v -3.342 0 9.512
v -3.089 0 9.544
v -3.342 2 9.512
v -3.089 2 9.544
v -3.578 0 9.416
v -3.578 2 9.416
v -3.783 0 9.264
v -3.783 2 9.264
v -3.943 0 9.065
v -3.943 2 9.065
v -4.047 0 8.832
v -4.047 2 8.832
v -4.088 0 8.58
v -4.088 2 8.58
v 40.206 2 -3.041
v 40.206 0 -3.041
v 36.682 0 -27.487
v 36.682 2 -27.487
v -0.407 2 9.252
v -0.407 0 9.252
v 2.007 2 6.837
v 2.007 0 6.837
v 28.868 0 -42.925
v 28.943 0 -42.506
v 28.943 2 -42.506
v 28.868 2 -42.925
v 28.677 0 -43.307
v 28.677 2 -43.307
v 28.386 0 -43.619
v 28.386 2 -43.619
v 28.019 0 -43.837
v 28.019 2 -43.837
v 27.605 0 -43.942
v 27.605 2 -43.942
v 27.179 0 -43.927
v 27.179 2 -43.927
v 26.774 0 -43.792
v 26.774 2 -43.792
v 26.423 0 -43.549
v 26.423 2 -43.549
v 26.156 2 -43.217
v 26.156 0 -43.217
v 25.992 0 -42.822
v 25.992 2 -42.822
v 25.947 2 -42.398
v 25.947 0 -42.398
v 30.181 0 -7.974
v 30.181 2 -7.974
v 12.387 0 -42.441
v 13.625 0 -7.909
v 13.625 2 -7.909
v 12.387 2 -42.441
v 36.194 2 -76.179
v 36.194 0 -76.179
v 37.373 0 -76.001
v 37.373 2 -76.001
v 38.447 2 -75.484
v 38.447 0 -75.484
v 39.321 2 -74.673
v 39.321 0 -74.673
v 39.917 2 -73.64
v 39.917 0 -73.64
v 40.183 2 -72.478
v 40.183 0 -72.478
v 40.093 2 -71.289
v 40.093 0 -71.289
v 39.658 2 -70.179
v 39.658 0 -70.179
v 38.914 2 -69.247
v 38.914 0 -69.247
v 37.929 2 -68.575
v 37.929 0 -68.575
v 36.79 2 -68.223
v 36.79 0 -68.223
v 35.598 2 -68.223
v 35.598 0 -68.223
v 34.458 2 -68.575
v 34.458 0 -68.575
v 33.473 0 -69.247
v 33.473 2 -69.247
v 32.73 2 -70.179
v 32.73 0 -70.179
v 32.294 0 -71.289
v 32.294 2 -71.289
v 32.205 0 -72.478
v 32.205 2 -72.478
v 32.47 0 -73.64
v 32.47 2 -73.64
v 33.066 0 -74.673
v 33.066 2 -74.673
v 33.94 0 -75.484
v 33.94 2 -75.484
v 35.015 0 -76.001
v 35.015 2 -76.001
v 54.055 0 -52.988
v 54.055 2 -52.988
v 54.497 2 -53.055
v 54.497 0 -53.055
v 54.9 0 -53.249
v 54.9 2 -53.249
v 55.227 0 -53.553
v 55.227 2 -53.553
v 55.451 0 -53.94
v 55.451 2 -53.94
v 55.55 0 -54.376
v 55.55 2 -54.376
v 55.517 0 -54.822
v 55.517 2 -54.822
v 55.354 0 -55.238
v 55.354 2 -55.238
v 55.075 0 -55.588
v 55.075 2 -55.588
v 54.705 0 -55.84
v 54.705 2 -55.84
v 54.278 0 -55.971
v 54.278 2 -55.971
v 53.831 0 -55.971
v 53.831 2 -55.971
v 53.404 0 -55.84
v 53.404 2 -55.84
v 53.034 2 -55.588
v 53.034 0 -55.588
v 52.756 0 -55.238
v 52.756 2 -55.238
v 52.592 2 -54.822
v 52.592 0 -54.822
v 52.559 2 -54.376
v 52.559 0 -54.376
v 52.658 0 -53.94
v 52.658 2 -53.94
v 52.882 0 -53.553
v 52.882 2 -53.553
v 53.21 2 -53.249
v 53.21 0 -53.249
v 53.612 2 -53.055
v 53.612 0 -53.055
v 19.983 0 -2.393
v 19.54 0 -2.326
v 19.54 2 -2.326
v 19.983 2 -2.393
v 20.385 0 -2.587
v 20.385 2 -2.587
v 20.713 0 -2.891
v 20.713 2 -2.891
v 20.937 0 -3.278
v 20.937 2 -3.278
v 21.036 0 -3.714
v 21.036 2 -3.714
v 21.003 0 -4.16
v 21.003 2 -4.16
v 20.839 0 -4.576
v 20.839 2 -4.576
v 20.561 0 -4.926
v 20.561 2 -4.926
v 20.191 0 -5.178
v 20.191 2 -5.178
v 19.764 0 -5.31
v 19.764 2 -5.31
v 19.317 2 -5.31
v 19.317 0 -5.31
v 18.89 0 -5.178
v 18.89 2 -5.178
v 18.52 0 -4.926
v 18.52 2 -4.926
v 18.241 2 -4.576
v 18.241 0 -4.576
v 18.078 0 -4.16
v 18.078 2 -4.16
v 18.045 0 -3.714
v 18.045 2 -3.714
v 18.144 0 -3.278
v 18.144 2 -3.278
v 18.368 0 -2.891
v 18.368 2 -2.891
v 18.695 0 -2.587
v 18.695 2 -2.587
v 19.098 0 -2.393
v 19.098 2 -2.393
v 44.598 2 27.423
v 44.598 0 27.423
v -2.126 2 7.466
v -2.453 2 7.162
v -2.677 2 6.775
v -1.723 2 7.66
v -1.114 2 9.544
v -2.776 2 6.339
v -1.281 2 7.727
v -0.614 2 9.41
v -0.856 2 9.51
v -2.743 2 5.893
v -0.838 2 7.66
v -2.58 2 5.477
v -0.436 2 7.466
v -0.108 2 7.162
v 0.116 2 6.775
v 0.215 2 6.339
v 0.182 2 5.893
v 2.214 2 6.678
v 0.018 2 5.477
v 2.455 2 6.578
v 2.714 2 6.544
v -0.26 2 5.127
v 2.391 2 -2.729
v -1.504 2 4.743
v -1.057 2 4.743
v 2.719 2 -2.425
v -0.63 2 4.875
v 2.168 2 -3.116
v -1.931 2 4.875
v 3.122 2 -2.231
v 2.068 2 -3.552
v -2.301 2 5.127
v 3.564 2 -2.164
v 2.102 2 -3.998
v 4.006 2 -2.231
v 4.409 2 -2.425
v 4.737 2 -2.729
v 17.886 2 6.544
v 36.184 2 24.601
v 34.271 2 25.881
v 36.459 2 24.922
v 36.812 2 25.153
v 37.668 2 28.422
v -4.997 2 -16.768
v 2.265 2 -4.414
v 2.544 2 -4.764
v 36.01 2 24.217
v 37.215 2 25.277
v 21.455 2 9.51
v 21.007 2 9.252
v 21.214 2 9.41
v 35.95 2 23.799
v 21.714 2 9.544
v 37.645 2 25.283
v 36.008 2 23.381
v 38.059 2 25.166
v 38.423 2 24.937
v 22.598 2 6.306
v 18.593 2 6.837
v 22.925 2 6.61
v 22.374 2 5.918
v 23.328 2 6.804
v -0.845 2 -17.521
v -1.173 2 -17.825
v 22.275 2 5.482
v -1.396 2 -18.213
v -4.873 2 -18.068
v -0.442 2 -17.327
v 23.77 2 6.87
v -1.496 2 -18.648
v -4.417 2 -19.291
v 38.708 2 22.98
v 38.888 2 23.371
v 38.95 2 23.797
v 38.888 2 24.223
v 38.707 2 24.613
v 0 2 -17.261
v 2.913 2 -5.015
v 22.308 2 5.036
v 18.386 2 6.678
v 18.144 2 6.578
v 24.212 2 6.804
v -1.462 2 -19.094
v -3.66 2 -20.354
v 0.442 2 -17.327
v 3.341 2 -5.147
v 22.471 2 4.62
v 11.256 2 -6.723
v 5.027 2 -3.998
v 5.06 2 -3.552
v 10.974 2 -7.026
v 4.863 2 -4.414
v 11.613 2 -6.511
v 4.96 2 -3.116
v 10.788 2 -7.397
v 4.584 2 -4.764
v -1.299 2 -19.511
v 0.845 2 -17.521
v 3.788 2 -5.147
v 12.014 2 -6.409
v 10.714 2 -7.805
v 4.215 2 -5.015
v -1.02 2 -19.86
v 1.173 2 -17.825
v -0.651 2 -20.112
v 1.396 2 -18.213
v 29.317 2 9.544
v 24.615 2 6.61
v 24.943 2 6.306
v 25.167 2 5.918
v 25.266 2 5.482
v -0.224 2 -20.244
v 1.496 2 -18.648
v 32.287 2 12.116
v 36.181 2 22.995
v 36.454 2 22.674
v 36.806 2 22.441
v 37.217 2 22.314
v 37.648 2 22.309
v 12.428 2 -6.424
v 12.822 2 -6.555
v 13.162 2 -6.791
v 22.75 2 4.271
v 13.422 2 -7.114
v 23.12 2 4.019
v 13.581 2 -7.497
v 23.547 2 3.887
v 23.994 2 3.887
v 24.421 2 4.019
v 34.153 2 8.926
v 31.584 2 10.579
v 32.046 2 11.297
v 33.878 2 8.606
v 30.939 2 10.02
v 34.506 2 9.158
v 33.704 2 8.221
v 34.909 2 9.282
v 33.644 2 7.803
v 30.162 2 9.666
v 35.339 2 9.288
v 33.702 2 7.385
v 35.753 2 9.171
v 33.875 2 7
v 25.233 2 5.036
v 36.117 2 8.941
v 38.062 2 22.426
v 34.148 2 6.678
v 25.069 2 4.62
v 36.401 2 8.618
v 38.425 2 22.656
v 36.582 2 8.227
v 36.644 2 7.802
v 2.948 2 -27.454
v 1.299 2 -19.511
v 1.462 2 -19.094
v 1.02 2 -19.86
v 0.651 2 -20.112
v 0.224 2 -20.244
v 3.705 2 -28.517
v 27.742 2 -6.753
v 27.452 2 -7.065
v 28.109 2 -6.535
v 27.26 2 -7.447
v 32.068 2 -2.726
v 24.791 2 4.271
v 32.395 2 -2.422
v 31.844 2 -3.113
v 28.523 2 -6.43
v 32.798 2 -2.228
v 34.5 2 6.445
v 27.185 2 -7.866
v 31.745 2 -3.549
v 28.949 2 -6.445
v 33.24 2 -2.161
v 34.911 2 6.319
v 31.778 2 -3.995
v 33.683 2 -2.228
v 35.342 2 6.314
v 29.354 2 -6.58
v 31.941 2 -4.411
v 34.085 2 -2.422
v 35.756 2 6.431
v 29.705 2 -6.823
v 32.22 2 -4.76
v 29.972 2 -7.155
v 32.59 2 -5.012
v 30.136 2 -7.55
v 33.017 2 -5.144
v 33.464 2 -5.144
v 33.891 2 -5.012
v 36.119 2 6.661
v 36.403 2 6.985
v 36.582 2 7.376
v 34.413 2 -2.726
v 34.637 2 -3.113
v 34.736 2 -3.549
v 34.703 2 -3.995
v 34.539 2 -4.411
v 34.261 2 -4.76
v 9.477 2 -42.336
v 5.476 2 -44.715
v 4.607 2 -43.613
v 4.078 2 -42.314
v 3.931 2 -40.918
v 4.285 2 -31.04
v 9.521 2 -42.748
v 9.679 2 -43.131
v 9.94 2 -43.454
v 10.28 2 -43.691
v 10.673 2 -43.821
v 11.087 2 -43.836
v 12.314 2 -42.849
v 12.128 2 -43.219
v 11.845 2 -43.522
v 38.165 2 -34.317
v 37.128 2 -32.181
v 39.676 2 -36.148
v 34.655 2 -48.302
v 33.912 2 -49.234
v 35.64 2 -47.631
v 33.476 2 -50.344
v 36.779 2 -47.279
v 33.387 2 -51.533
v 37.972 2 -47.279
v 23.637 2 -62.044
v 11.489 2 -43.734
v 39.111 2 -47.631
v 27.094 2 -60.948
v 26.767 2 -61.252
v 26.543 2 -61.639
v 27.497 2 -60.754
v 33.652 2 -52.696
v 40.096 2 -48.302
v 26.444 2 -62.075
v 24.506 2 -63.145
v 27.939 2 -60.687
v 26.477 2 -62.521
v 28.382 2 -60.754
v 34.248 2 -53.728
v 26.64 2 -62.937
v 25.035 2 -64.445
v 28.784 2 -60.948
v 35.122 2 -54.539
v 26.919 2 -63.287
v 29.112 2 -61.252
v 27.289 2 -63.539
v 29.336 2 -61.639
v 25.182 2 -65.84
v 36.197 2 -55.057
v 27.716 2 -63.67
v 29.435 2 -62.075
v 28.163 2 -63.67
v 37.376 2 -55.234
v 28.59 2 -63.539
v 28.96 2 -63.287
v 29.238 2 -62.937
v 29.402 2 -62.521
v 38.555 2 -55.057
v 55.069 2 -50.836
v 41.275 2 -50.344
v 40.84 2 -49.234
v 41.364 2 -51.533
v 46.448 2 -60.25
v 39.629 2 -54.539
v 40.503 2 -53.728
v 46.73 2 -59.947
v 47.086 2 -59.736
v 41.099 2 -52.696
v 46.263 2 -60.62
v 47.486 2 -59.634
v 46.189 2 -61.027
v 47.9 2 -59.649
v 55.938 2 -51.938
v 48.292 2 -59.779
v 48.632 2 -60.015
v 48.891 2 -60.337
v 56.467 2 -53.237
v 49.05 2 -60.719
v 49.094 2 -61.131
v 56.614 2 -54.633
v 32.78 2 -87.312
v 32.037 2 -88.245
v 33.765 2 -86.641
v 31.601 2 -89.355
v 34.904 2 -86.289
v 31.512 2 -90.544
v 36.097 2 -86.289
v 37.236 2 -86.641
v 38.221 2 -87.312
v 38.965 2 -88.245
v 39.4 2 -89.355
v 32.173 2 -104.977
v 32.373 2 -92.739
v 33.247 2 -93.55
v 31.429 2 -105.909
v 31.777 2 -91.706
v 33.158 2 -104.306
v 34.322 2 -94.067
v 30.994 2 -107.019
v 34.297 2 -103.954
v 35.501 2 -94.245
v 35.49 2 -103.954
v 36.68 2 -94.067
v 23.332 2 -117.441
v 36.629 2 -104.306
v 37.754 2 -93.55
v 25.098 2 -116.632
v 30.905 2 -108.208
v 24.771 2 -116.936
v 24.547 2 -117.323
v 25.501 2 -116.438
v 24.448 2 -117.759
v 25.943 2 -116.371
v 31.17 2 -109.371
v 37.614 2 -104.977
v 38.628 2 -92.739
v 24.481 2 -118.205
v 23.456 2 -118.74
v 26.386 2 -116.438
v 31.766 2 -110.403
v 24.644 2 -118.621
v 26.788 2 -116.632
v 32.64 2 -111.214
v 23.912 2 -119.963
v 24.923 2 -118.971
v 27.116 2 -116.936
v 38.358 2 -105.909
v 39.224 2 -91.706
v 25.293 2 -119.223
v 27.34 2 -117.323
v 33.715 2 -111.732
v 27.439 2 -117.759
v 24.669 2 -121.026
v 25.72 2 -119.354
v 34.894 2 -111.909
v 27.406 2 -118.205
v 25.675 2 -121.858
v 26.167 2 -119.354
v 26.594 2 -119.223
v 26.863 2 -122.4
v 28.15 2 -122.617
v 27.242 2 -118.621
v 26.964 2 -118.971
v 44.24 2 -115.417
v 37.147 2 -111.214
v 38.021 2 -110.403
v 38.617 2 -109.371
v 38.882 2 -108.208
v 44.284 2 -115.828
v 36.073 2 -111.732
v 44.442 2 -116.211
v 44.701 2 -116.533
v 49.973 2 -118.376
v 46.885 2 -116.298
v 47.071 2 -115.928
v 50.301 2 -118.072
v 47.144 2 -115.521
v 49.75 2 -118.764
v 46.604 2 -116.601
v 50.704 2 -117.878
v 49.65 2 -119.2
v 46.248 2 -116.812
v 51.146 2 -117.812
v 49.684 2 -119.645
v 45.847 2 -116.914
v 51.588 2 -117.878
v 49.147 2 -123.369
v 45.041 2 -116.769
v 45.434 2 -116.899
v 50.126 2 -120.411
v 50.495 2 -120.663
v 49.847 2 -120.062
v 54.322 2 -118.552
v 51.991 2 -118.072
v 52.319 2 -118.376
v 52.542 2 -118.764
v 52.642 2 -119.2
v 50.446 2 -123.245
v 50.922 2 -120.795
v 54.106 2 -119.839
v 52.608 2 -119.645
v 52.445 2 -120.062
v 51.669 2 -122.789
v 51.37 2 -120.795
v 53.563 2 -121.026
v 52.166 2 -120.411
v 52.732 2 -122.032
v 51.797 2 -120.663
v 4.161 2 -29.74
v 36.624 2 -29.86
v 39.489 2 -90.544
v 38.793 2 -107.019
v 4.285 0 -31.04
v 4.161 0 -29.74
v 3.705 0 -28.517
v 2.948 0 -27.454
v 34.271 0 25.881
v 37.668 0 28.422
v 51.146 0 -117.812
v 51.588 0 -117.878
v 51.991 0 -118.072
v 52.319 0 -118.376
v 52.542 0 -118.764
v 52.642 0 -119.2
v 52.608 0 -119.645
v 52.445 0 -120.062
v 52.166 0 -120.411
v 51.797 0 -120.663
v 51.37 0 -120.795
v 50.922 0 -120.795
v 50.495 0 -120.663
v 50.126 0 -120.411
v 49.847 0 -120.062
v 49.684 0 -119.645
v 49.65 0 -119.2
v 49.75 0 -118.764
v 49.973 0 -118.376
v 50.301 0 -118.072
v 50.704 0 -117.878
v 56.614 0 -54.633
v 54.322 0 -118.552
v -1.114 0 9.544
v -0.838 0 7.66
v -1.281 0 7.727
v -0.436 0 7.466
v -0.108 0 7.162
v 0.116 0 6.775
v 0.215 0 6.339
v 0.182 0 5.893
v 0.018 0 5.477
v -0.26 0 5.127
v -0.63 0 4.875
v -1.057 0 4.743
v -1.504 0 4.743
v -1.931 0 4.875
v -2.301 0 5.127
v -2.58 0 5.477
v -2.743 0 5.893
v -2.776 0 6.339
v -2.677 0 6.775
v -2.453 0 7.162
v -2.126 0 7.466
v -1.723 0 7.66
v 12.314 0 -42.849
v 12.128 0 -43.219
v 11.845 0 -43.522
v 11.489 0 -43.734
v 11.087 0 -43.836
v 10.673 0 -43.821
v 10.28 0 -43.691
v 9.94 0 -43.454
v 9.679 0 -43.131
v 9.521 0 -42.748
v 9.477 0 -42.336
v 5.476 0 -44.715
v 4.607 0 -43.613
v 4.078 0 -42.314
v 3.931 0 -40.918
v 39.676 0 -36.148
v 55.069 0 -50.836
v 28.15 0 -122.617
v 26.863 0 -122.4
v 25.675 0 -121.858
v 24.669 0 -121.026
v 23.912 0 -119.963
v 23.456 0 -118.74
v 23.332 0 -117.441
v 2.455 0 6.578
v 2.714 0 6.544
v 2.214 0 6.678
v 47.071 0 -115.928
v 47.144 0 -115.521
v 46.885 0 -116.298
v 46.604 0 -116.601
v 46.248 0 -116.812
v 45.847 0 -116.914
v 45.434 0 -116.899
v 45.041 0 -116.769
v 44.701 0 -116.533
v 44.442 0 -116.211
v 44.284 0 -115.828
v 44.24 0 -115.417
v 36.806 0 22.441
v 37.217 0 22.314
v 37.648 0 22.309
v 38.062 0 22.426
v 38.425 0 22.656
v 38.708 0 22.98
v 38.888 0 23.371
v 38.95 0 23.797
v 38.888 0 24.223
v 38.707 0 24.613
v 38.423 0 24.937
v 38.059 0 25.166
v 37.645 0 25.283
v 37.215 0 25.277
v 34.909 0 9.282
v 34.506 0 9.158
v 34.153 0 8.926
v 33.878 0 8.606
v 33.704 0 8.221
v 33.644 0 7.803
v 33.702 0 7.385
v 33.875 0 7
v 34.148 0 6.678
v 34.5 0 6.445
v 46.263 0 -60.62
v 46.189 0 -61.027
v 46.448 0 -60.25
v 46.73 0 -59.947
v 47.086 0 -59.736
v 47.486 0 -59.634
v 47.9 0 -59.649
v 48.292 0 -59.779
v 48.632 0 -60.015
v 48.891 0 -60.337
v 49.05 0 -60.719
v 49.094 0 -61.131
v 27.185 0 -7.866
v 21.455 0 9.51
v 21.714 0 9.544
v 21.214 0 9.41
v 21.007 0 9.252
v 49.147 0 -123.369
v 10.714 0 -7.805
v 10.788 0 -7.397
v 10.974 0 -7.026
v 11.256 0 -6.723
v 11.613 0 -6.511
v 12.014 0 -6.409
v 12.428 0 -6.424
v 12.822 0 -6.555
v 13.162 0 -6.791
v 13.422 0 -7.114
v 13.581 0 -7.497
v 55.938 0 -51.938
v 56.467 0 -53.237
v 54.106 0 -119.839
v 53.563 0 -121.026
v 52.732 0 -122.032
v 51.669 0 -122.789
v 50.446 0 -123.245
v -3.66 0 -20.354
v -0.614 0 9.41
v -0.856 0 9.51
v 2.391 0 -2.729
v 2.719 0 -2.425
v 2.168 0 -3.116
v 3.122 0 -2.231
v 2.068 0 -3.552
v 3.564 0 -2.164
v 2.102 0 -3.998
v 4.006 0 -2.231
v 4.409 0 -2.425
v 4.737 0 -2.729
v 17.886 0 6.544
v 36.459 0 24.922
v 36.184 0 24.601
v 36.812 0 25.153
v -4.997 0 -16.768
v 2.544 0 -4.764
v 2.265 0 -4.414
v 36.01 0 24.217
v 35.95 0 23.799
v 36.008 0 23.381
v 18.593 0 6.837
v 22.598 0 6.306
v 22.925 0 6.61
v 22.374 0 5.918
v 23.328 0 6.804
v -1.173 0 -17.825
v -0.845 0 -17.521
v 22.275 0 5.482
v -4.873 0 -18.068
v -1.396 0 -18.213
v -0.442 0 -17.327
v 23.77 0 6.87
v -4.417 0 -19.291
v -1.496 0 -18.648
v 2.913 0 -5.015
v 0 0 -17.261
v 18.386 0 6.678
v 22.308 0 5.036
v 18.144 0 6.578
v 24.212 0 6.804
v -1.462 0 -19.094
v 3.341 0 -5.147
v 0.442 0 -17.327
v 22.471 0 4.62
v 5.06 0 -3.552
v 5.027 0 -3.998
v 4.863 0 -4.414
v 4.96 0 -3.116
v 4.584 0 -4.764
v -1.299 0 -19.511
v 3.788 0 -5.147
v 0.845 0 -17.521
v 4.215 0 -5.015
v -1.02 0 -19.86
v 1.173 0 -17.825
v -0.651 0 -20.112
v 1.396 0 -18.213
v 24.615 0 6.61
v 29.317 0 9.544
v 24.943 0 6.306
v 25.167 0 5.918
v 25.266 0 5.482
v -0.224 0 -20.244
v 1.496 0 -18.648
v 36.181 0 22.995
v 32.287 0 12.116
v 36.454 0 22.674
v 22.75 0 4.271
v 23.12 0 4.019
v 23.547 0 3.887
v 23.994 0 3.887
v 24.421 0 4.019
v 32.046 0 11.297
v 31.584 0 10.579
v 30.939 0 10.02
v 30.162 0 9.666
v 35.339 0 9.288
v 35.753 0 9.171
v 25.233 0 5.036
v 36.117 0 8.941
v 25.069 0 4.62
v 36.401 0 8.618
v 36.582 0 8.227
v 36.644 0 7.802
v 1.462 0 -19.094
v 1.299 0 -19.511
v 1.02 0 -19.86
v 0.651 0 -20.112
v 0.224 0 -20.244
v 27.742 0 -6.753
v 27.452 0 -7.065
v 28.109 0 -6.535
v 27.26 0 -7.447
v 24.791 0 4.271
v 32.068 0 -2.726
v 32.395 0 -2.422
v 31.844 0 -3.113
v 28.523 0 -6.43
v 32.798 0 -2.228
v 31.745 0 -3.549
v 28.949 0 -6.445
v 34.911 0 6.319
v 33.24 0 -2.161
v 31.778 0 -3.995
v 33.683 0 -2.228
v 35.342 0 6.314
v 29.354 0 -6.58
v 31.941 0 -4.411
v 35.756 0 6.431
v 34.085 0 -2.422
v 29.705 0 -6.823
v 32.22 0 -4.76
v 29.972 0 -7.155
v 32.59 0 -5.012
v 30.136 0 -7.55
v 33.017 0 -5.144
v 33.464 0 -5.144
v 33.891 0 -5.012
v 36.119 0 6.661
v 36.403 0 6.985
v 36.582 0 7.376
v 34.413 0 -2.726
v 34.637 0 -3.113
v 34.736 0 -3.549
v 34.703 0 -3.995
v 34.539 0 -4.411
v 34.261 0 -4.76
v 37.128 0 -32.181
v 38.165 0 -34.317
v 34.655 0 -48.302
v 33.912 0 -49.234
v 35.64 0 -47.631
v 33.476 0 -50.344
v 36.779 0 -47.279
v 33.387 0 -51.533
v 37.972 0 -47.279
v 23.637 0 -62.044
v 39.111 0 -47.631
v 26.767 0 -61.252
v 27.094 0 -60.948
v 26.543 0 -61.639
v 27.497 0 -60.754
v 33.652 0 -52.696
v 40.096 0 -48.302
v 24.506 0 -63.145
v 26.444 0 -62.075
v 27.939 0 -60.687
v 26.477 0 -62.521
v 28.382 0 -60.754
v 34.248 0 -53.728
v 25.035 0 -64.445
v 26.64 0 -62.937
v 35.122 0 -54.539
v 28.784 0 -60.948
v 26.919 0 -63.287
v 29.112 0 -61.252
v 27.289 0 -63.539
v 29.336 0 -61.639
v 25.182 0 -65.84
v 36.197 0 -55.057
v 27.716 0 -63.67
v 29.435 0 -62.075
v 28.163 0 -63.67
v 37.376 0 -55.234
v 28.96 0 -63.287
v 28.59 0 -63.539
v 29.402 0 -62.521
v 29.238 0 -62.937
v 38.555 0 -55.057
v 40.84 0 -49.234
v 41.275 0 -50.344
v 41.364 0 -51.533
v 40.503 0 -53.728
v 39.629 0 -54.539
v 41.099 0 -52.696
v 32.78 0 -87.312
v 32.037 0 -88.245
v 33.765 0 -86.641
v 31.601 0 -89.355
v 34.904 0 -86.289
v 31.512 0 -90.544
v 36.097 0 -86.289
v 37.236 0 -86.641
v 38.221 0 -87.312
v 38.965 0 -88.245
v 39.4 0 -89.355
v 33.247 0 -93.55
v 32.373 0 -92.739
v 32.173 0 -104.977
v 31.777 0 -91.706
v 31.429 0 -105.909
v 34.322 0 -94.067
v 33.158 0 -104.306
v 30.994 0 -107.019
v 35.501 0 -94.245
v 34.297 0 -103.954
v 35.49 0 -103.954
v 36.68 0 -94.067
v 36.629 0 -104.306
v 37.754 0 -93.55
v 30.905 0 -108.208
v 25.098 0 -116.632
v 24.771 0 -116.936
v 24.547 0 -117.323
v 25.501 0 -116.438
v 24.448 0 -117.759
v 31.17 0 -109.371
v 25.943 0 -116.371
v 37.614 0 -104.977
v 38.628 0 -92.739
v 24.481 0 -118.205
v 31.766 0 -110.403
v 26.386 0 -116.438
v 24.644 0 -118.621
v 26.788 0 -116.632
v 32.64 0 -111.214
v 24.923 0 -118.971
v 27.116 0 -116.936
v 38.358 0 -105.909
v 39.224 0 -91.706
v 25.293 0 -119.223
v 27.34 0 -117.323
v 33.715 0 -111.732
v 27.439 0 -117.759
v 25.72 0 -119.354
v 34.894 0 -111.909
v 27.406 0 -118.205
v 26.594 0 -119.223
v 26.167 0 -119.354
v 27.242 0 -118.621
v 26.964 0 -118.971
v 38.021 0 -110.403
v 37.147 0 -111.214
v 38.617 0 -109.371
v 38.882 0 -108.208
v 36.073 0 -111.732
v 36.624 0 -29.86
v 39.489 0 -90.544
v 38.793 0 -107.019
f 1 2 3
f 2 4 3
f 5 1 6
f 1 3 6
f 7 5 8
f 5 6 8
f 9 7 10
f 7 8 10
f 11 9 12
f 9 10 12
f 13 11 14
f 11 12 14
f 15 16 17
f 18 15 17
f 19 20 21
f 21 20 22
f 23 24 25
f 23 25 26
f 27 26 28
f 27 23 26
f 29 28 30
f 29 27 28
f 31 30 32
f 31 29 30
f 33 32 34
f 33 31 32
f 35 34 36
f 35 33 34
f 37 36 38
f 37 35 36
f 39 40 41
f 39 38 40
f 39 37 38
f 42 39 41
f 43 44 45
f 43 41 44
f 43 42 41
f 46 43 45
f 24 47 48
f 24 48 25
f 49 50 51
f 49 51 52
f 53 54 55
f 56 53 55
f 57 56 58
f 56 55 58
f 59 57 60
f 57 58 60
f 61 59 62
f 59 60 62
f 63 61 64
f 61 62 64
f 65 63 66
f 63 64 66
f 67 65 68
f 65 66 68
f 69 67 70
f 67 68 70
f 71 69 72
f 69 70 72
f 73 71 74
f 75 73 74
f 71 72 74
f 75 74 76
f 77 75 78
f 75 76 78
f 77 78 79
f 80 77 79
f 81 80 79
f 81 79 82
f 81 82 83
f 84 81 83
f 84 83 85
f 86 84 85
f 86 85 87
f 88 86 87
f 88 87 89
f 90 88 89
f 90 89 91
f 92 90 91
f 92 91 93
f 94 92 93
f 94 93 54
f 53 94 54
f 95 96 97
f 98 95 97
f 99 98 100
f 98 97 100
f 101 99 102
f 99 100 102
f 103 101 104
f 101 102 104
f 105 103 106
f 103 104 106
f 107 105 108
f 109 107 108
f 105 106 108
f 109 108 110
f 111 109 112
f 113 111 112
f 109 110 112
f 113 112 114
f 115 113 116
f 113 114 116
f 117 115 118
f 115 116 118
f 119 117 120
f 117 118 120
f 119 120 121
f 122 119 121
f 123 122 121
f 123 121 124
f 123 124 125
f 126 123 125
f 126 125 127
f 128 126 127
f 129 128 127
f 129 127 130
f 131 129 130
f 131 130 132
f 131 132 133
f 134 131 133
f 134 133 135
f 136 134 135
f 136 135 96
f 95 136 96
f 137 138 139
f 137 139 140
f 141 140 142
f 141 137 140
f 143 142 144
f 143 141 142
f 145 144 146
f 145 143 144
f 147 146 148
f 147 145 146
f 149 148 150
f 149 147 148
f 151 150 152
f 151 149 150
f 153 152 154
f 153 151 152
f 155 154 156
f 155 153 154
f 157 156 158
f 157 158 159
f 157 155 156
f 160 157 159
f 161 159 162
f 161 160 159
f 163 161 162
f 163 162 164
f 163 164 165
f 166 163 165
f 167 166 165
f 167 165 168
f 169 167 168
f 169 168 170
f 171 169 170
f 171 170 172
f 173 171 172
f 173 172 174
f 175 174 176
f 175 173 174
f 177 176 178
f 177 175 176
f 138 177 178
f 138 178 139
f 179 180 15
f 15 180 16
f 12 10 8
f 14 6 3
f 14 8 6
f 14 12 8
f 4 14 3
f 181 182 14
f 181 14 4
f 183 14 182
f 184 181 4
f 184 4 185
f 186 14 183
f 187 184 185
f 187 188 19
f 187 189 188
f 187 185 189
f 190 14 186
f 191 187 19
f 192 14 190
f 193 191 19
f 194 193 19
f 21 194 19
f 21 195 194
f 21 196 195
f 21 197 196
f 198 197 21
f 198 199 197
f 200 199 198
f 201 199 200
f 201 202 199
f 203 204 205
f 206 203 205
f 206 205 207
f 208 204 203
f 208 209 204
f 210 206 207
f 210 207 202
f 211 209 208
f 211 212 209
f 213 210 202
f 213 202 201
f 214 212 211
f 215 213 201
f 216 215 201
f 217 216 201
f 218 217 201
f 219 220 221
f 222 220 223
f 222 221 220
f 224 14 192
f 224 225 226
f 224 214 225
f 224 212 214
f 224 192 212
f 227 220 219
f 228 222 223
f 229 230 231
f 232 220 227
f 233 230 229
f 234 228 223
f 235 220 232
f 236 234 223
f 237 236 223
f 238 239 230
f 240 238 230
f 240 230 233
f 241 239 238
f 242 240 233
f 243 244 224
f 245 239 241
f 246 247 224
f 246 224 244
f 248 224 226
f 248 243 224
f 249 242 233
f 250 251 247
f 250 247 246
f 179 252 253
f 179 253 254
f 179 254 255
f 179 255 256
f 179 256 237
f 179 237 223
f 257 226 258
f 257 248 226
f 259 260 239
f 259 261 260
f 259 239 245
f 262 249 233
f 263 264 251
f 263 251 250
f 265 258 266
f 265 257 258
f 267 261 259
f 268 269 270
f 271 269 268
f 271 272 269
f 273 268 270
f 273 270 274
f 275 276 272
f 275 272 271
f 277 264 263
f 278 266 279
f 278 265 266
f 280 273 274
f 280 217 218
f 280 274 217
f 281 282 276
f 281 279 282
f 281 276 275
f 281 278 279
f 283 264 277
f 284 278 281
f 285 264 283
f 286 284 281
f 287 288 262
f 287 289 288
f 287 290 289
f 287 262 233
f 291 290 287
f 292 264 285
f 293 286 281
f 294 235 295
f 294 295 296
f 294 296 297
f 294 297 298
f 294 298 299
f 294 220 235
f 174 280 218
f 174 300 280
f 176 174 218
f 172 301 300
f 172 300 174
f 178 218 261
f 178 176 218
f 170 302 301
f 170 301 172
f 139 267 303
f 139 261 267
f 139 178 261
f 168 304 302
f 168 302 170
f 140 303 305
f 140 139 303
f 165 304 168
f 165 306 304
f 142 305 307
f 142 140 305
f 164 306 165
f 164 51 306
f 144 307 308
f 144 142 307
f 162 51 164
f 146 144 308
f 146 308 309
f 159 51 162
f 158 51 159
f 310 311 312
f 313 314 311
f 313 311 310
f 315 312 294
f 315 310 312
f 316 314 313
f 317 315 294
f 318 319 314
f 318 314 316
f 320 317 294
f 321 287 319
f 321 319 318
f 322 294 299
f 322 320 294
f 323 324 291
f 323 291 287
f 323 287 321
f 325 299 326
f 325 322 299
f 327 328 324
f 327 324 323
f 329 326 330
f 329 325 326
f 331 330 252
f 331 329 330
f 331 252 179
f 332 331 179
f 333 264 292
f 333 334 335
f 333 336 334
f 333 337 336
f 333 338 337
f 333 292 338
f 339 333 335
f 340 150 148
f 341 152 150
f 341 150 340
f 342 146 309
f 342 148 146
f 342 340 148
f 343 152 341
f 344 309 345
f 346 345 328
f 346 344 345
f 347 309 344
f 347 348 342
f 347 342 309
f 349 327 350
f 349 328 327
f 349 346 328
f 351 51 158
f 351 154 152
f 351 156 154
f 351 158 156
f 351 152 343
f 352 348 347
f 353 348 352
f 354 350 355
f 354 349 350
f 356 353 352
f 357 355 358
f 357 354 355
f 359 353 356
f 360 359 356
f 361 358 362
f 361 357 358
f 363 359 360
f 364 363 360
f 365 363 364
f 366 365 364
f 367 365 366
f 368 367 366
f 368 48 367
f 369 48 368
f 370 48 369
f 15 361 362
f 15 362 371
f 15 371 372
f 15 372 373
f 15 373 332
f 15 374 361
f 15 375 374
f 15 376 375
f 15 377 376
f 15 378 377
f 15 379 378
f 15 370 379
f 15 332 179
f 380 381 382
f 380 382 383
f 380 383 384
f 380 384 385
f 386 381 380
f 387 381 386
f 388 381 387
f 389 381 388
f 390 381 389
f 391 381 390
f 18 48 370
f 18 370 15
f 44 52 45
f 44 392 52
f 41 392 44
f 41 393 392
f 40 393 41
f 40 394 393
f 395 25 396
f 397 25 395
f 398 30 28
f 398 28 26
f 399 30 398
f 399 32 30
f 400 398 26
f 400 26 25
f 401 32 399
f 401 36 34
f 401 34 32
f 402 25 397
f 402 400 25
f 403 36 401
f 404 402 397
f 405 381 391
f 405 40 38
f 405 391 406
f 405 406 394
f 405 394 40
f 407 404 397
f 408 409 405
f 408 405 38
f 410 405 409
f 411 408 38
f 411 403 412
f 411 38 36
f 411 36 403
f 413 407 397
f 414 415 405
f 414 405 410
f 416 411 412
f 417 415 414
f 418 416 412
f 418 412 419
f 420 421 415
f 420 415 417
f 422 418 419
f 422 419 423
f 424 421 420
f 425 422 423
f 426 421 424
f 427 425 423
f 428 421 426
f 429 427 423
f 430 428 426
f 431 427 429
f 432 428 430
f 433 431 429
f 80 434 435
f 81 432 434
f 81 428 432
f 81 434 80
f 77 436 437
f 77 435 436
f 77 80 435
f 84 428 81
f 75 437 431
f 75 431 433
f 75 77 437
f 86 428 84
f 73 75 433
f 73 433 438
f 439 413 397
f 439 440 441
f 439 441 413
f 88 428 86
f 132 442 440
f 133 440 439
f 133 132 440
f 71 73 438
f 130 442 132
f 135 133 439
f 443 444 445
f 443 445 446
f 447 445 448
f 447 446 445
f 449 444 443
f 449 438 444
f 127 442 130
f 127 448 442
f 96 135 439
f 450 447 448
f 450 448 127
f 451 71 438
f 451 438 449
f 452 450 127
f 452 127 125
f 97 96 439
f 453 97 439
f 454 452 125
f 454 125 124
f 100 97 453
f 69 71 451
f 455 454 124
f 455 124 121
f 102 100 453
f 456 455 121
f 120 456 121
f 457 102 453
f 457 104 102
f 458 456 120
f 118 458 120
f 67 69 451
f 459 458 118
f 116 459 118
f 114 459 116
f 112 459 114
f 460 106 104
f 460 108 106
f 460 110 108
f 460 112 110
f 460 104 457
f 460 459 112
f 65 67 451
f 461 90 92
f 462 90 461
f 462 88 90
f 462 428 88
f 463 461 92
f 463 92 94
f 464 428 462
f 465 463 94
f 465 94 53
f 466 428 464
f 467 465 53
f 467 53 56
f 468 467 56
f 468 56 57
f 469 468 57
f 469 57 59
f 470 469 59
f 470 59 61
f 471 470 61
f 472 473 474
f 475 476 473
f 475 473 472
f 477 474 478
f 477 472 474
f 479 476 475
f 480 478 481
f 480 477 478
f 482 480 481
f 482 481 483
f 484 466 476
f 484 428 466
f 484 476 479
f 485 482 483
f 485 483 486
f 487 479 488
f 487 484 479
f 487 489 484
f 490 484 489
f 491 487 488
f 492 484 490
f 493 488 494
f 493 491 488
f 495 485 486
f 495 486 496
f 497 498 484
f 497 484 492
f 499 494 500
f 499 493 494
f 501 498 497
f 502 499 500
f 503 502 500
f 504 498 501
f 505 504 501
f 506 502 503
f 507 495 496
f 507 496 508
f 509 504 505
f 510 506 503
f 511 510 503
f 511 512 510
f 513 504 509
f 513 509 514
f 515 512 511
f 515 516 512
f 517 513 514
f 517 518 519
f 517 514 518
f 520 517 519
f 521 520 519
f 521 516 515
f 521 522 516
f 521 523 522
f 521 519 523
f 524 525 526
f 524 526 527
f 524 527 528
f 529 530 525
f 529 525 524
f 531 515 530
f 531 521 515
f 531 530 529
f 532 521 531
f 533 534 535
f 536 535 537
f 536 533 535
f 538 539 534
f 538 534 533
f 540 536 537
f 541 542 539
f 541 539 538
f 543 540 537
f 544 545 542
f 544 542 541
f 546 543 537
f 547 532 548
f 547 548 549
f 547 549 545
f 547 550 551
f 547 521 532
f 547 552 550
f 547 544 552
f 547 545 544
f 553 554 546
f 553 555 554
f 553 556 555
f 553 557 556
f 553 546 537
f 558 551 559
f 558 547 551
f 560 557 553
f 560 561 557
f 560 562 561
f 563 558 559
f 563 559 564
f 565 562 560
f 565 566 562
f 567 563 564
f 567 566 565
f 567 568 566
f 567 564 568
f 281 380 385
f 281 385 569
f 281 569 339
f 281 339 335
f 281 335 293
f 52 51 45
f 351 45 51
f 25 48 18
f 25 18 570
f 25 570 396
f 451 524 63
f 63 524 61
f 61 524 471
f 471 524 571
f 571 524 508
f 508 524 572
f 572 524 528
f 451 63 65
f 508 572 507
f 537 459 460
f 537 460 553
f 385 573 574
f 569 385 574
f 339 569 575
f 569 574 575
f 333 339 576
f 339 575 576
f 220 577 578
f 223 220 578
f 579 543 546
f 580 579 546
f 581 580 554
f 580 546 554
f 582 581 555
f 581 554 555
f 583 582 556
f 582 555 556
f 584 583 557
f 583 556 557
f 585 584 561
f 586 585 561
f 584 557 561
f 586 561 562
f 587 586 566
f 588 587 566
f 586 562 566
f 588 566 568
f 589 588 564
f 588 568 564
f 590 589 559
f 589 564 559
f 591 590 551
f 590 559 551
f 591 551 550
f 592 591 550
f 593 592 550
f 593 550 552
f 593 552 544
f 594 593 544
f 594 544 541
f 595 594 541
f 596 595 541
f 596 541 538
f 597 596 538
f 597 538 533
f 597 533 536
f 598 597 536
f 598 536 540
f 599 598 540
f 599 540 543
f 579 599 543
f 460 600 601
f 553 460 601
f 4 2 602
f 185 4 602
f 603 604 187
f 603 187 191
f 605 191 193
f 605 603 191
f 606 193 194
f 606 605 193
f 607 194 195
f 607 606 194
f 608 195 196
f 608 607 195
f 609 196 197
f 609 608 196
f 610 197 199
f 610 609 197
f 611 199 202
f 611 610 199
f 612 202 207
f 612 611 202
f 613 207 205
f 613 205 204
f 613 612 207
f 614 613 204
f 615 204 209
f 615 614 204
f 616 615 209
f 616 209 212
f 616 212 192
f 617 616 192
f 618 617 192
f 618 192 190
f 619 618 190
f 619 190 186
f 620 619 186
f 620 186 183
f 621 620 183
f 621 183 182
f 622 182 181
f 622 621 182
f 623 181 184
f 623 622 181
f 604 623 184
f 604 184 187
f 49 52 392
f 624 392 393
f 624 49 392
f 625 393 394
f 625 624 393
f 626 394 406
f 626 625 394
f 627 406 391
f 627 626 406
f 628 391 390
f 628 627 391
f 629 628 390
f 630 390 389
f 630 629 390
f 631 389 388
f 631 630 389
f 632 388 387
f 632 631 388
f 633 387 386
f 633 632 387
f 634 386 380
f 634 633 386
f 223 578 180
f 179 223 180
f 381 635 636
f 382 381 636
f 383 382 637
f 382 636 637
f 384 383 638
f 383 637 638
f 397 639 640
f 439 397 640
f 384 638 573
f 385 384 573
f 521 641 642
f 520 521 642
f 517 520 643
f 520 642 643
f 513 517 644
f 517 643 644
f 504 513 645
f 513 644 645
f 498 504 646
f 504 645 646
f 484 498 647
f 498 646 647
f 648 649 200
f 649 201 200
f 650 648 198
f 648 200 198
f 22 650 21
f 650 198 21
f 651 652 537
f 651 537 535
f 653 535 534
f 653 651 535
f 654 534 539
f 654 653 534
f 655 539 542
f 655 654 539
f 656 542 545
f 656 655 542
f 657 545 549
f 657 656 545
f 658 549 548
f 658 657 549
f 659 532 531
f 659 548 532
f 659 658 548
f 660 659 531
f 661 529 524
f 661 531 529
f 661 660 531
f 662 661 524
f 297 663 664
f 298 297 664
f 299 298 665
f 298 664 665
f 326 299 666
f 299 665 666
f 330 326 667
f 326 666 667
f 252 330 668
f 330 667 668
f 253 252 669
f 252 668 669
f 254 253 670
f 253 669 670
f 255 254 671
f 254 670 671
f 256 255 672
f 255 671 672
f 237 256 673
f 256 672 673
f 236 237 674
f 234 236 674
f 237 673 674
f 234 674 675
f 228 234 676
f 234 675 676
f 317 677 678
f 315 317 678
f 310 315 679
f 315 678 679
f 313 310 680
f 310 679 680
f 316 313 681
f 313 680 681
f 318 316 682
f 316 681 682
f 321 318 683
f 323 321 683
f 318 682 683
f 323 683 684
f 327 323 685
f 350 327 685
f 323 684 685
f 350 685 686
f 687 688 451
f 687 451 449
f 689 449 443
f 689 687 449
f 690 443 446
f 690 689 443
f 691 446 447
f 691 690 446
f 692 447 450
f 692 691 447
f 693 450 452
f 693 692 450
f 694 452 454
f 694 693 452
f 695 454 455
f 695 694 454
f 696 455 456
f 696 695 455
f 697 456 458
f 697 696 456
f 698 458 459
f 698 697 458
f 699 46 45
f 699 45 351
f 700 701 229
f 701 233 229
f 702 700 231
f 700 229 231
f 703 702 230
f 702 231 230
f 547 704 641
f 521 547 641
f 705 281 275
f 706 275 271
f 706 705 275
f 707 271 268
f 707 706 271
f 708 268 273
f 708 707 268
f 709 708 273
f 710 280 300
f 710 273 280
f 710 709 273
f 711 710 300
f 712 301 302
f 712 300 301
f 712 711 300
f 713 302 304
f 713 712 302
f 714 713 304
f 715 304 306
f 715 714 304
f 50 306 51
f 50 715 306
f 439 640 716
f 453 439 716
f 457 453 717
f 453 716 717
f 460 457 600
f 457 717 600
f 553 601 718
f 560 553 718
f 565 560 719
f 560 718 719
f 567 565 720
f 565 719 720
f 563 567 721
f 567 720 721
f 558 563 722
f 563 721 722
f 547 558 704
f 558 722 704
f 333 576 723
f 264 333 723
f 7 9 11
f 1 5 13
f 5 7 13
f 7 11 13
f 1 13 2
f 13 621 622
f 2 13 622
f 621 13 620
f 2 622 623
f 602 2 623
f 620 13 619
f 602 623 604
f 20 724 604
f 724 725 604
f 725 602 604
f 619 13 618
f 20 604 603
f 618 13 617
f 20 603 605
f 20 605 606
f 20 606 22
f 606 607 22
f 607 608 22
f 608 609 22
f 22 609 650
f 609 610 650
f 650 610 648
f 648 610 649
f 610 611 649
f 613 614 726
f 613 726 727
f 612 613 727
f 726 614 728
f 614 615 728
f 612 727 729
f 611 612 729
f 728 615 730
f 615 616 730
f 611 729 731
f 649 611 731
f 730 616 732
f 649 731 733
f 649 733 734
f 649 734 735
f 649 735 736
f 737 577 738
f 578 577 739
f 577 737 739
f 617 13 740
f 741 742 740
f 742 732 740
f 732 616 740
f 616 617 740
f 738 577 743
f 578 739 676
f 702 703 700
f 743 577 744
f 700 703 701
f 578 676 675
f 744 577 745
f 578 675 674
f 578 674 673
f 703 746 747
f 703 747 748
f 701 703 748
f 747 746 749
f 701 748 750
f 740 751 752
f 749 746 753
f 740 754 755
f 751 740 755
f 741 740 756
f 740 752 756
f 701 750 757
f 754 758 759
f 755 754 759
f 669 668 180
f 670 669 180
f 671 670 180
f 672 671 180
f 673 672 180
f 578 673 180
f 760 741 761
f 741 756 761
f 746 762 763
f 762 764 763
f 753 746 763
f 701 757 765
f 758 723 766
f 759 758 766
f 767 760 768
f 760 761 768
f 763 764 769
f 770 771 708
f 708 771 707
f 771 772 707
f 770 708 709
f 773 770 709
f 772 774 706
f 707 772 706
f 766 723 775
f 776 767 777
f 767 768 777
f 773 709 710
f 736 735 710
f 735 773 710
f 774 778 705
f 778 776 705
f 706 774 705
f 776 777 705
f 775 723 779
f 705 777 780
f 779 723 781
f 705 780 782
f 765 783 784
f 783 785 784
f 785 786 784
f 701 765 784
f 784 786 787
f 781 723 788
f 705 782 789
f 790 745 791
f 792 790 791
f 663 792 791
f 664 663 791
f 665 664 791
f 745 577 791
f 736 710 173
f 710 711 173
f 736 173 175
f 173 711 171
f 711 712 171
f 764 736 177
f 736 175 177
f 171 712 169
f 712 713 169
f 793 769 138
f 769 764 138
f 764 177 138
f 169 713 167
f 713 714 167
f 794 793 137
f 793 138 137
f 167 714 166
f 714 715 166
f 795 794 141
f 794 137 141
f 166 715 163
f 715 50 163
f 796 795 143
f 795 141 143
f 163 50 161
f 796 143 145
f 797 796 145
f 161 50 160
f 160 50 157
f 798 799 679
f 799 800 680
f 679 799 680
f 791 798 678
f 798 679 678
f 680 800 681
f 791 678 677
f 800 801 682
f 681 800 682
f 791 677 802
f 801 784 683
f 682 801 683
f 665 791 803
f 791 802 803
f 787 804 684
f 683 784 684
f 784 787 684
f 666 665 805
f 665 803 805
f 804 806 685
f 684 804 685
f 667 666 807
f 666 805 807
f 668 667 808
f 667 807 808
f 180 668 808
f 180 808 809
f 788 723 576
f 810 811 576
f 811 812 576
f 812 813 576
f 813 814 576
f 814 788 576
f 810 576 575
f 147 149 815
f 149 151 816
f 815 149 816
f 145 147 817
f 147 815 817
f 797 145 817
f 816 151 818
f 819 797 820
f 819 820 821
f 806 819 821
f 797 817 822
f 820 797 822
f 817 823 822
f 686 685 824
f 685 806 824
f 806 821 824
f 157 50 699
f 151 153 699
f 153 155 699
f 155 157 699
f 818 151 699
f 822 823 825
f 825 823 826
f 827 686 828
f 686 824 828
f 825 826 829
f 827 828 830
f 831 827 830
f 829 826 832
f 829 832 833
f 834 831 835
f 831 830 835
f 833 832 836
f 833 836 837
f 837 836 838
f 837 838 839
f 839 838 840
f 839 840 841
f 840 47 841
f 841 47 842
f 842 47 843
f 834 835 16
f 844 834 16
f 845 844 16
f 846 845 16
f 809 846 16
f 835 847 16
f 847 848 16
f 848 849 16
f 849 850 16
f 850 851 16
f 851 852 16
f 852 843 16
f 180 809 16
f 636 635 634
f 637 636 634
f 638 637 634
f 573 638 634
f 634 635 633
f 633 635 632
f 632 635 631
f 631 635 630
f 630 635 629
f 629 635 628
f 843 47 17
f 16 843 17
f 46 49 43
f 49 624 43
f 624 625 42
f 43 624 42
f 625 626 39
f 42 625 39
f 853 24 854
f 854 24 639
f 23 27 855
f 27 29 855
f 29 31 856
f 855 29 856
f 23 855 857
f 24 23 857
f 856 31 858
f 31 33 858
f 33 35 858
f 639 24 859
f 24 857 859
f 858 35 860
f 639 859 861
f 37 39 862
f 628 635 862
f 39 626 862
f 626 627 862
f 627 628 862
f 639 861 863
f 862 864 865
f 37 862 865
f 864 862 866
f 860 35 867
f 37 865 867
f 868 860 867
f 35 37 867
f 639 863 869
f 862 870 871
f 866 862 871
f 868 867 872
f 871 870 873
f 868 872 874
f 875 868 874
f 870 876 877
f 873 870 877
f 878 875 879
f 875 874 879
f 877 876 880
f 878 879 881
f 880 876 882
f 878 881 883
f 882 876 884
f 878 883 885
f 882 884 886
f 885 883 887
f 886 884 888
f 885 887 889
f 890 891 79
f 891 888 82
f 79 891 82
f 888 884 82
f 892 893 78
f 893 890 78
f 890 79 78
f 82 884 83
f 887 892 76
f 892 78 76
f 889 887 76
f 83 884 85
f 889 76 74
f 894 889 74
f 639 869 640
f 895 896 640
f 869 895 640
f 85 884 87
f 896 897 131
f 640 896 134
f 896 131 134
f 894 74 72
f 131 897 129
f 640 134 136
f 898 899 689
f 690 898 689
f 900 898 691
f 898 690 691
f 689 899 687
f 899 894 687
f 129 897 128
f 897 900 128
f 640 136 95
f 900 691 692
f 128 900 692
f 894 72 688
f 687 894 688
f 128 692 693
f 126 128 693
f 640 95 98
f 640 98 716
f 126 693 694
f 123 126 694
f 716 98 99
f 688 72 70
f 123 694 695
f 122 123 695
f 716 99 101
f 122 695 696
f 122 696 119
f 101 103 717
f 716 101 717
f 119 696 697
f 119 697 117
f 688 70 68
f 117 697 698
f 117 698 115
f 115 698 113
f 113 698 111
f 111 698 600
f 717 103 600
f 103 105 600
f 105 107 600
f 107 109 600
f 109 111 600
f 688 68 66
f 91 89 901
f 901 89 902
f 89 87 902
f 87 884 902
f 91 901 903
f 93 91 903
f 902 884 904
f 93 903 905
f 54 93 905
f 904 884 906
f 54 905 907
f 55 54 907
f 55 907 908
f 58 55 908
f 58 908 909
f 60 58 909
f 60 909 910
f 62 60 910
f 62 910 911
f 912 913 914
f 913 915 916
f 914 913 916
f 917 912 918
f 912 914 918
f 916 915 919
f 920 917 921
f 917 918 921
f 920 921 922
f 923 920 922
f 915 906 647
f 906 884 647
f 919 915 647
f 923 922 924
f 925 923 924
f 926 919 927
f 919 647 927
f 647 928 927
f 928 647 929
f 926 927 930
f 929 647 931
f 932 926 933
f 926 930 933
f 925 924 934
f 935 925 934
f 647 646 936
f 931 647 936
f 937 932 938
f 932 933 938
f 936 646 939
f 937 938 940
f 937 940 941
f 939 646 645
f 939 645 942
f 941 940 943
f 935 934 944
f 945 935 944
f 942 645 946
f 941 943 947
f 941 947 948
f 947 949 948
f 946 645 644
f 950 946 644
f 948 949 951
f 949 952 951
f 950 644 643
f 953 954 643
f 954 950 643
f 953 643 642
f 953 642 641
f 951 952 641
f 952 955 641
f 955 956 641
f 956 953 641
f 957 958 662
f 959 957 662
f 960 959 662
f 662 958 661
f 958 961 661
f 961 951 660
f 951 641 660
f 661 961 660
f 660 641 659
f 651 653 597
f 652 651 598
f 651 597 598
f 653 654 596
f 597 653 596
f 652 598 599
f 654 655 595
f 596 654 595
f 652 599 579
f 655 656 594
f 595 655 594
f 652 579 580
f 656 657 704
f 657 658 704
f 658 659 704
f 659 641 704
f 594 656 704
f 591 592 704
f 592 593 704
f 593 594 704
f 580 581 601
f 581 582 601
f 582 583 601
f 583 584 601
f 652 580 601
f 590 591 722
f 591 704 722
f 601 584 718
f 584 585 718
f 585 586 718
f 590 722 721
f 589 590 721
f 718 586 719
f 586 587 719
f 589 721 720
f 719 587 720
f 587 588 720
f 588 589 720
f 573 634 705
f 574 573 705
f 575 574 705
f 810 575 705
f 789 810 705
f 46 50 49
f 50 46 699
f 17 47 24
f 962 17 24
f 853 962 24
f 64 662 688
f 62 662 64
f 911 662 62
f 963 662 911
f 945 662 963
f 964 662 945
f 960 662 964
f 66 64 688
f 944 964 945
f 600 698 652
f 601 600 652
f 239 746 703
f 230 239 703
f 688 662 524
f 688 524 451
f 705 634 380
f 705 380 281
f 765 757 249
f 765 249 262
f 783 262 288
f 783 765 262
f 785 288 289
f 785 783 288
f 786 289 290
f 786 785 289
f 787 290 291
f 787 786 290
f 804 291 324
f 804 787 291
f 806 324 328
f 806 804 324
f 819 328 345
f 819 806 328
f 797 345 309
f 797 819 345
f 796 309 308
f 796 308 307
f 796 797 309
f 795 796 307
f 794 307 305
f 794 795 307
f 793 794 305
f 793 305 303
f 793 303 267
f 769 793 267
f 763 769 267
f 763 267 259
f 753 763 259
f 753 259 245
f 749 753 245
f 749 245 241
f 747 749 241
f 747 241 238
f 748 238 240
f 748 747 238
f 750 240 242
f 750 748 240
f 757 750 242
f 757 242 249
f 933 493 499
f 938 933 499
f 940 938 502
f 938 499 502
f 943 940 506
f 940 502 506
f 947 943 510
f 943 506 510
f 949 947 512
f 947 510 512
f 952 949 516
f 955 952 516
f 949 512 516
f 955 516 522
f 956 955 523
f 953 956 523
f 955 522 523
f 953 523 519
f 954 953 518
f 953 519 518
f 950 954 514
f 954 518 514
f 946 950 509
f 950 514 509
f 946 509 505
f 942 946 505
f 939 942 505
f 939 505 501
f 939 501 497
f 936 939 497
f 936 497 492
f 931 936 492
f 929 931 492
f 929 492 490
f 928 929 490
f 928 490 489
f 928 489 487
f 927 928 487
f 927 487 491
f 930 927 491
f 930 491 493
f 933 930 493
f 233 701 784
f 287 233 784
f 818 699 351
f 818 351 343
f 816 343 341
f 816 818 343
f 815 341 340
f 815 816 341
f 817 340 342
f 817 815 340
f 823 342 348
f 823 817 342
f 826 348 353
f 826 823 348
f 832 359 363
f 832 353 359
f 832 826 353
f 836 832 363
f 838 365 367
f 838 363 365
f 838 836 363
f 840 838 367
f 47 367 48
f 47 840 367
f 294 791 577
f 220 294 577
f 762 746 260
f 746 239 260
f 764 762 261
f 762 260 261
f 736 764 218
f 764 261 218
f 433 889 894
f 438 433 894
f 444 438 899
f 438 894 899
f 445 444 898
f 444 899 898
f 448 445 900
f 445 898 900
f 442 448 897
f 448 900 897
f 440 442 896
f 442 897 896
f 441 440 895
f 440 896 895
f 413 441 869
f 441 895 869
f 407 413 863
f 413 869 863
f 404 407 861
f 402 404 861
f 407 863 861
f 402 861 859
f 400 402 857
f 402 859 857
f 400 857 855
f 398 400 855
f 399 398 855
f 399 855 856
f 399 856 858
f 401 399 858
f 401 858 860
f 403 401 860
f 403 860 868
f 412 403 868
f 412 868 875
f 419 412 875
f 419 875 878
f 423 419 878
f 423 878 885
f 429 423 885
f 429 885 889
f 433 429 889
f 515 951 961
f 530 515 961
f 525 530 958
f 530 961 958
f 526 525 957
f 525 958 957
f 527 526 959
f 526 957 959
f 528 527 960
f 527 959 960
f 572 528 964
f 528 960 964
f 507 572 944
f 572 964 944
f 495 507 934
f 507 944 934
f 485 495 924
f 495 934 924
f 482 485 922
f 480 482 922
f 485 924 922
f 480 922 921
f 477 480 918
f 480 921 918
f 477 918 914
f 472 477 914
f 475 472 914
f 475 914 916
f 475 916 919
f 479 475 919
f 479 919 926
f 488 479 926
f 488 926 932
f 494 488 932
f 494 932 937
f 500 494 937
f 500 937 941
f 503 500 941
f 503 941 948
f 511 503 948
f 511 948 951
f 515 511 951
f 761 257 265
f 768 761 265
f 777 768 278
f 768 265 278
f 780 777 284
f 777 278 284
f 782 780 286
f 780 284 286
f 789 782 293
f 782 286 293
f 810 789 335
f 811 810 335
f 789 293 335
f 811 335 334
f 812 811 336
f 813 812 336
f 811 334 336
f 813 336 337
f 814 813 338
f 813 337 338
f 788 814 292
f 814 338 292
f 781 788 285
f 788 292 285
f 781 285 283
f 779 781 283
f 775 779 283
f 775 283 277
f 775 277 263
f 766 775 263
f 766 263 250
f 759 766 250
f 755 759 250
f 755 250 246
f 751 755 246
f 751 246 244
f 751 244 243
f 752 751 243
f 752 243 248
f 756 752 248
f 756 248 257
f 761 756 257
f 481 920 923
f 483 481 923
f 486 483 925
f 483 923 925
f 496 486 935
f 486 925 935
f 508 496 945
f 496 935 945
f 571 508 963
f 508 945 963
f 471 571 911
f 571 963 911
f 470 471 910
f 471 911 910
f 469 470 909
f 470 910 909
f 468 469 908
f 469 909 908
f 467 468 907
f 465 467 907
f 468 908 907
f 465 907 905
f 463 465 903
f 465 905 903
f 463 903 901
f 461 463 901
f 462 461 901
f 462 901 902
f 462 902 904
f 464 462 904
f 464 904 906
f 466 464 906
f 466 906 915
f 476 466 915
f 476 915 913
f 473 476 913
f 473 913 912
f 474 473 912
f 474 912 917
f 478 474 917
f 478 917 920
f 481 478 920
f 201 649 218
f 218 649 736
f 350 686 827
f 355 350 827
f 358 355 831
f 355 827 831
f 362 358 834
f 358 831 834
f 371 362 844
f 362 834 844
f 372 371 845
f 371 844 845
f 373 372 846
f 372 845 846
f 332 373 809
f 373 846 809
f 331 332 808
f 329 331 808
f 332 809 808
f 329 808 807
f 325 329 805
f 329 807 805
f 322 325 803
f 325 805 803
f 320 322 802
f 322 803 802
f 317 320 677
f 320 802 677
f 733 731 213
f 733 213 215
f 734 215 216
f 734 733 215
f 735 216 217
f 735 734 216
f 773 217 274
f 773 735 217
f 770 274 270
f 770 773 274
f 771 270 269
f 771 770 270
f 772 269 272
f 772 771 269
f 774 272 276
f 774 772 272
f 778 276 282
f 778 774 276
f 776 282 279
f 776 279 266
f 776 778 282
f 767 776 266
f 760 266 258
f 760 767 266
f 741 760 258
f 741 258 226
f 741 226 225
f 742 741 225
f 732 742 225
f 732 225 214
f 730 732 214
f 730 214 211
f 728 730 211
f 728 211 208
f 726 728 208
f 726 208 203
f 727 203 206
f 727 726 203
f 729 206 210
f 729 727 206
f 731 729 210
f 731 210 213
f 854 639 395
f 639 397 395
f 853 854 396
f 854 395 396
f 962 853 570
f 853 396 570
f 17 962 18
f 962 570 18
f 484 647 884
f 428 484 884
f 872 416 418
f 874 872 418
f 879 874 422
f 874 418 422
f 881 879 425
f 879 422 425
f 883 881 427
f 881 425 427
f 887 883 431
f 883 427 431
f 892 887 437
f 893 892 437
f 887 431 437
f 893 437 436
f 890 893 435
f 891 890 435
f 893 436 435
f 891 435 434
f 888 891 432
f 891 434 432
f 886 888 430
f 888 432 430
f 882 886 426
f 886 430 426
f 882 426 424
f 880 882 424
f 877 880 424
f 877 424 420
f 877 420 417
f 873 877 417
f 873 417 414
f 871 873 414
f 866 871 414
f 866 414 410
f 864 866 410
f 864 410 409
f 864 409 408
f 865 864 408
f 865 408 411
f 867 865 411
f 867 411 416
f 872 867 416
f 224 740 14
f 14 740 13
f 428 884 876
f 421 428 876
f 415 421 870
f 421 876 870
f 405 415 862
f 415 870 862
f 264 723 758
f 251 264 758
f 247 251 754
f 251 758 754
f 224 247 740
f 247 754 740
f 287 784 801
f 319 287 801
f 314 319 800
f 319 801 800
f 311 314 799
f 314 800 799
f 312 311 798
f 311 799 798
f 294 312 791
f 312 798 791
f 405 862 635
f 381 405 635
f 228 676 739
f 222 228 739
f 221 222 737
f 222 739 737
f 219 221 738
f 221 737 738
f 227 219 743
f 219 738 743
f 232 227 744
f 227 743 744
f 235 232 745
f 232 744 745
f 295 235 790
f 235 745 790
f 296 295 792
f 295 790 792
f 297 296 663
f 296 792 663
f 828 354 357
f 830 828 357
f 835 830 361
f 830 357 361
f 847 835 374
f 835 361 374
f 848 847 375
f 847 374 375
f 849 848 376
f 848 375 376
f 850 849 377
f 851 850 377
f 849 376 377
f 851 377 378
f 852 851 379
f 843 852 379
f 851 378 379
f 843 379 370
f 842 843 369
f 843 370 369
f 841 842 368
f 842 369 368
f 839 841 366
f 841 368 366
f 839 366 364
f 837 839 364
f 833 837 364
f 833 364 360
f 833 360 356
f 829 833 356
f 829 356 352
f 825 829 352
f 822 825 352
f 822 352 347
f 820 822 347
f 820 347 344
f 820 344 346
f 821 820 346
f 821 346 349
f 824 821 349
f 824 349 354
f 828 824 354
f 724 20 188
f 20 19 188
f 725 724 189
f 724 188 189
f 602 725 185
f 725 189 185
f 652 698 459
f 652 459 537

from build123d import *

# Parameters (mm, degrees)
SKETCH1_R           = 1.5
BOSS_EXTRUDE1_DEPTH = 2
SKETCH2_R           = 4
CUT_EXTRUDE1_DEPTH  = 136.757961465
SKETCH3_R           = 1.5
CUT_EXTRUDE2_DEPTH  = 10
FILLET1_R           = 10
CUT_EXTRUDE3_DEPTH  = 23
FILLET2_R           = 1


with BuildPart() as part:
    # Sketch1 → Boss-Extrude1 (new body)
    with BuildSketch(Plane(origin=(0, 0, 0), x_dir=(1, 0, 0), z_dir=(0, 1, 0))):
        with BuildLine():
            Line((35.946087305, 32.589224444), (55.068611132, 50.836380863))
            ThreePointArc((55.068611132, 50.836380863), (56.248023483, 52.569022886), (56.613633222, 54.632852189))
            Line((56.613633222, 54.632852189), (54.322448331, 118.551544644))
            ThreePointArc((54.322448331, 118.551544644), (52.732271224, 122.032348819), (49.146545971, 123.369224039))
            Line((49.146545971, 123.369224039), (28.149749669, 122.616587516))
            ThreePointArc((28.149749669, 122.616587516), (24.668945494, 121.026410408), (23.332070273, 117.440685156))
            Line((23.332070273, 117.440685156), (25.181696492, 65.840445524))
            ThreePointArc((25.181696492, 65.840445524), (24.816086753, 63.776616221), (23.636674402, 62.043974198))
            Line((23.636674402, 62.043974198), (5.476247543, 44.714873053))
            ThreePointArc((5.476247543, 44.714873053), (4.296835192, 42.98223103), (3.931225452, 40.918401728))
            Line((3.931225452, 40.918401728), (4.285331317, 31.039677436))
            ThreePointArc((4.285331317, 31.039677436), (3.973516256, 29.113854302), (2.948456097, 27.453952183))
            Line((2.948456097, 27.453952183), (-3.659915658, 20.354208893))
            ThreePointArc((-3.659915658, 20.354208893), (-4.684975817, 18.694306775), (-4.996790878, 16.768483641))
            Line((-4.996790878, 16.768483641), (-4.053596951, -9.544417952))
            Line((-4.053596951, -9.544417952), (-0.700132194, -9.544417952))
            Line((-0.700132194, -9.544417952), (2.299867806, -6.544417952))
            Line((2.299867806, -6.544417952), (18.299867806, -6.544417952))
            Line((18.299867806, -6.544417952), (21.299867806, -9.544417952))
            Line((21.299867806, -9.544417952), (26.299867806, -9.544417952))
            Line((26.299867806, -9.544417952), (28.299867806, -9.544417952))
            Line((28.299867806, -9.544417952), (29.317405641, -9.544417952))
            ThreePointArc((29.317405641, -9.544417952), (31.281555871, -10.276794995), (32.286707076, -12.116342036))
            Line((32.286707076, -12.116342036), (34.27107148, -25.880667111))
            Line((34.27107148, -25.880667111), (37.668448831, -28.421892629))
            Line((37.668448831, -28.421892629), (44.597867771, -27.422897603))
            Line((44.597867771, -27.422897603), (40.206014976, 3.040705467))
            Line((40.206014976, 3.040705467), (35.946087305, 32.589224444))
        make_face()
        with Locations(Location((23.770367042, -5.370271096, 0), (0, 0, 270))):
            Circle(SKETCH1_R, mode=Mode.SUBTRACT)
        with Locations(Location((19.540458754, 3.826449386, 0), (0, 0, 270))):
            Circle(SKETCH1_R, mode=Mode.SUBTRACT)
        with Locations(Location((-1.280541484, -6.226605145, 0), (0, 0, 270))):
            Circle(SKETCH1_R, mode=Mode.SUBTRACT)
        with Locations(Location((3.564149135, 3.664002019, 0), (0, 0, 270))):
            Circle(SKETCH1_R, mode=Mode.SUBTRACT)
    extrude(amount=BOSS_EXTRUDE1_DEPTH)

    # Sketch2 → Cut-Extrude1 (cut, through all)
    with BuildSketch(Plane.XZ):
        with Locations(Location((34.893536441, -107.909402778, 0), (0, 0, 270))):
            Circle(SKETCH2_R)
        with Locations(Location((35.500605714, -90.244703074, 0), (0, 0, 270))):
            Circle(SKETCH2_R)
        with Locations(Location((37.375632996, -51.234404776, 0), (0, 0, 270))):
            Circle(SKETCH2_R)
        with Locations(Location((36.193690526, -72.178757044, 0), (0, 0, 270))):
            Circle(SKETCH2_R)
        with BuildLine():
            Line((9.476681481, -42.336326168), (10.714476932, -7.804732036))
            ThreePointArc((10.714476932, -7.804732036), (12.221884959, -6.401651358), (13.624965636, -7.909059385))
            Line((13.624965636, -7.909059385), (12.387170186, -42.440653517))
            ThreePointArc((12.387170186, -42.440653517), (10.879762159, -43.843734194), (9.476681481, -42.336326168))
        make_face()
        with BuildLine():
            Line((25.946876638, -42.39809035), (27.184672089, -7.866496218))
            ThreePointArc((27.184672089, -7.866496218), (28.736682558, -6.421900022), (30.181278754, -7.973910491))
            Line((30.181278754, -7.973910491), (28.943483303, -42.505504623))
            ThreePointArc((28.943483303, -42.505504623), (27.391472834, -43.950100819), (25.946876638, -42.39809035))
        make_face()
        with BuildLine():
            Line((44.239527936, -115.417065328), (46.189170661, -61.026599384))
            ThreePointArc((46.189170661, -61.026599384), (47.693530634, -59.626355806), (49.093774212, -61.130715778))
            Line((49.093774212, -61.130715778), (47.144131486, -115.521181722))
            ThreePointArc((47.144131486, -115.521181722), (45.639771514, -116.9214253), (44.239527936, -115.417065328))
        make_face()
    extrude(amount=-CUT_EXTRUDE1_DEPTH, mode=Mode.SUBTRACT)

    # Sketch3 → Cut-Extrude2 (cut)
    with BuildSketch(Plane(origin=(0, 2, 0), x_dir=(1, 0, 0), z_dir=(0, 1, 0))):
        with Locations(Location((0, 18.76051869, 0), (0, 0, 270))):
            Circle(SKETCH3_R)
        with Locations(Location((54.054577559, 54.488184987, 0), (0, 0, 270))):
            Circle(SKETCH3_R)
        with Locations(Location((25.943400363, 117.871083174, 0), (0, 0, 270))):
            Circle(SKETCH3_R)
        with Locations(Location((51.146049593, 119.311681239, 0), (0, 0, 270))):
            Circle(SKETCH3_R)
        with Locations(Location((27.939408723, 62.187124606, 0), (0, 0, 270))):
            Circle(SKETCH3_R)
        with Locations(Location((33.240387063, 3.660878573, 0), (0, 0, 270))):
            Circle(SKETCH3_R)
    extrude(amount=-CUT_EXTRUDE2_DEPTH, mode=Mode.SUBTRACT)

    # Fillet1
    fillet1_edges = [part.edges().sort_by_distance(p)[0] for p in [
        (35.946087305, 1, -32.589224444),
    ]]
    fillet(fillet1_edges, radius=FILLET1_R)

    # Sketch4 → Cut-Extrude3 (cut)
    with BuildSketch(Plane.XZ):
        with BuildLine():
            ThreePointArc((36.806162994, 22.440741914), (38.934316746, 23.581659248), (37.215093343, 25.27724223))
            ThreePointArc((37.215093343, 25.27724223), (35.965015311, 24.009735165), (36.806162994, 22.440741914))
        make_face()
        with BuildLine():
            ThreePointArc((34.909100758, 9.281978715), (33.659022726, 8.014471651), (34.500170409, 6.4454784))
            ThreePointArc((34.500170409, 6.4454784), (36.628324161, 7.586395734), (34.909100758, 9.281978715))
        make_face()
    extrude(amount=-CUT_EXTRUDE3_DEPTH, mode=Mode.SUBTRACT)

    # Fillet2
    fillet2_edges = [part.edges().sort_by_distance(p)[0] for p in [
        (21.299867806, 1, 9.544417952),
        (18.299867806, 1, 6.544417952),
        (2.299867806, 1, 6.544417952),
        (-0.700132194, 1, 9.544417952),
        (-4.053596951, 1, 9.544417952),
    ]]
    fillet(fillet2_edges, radius=FILLET2_R)


solid = part.part
